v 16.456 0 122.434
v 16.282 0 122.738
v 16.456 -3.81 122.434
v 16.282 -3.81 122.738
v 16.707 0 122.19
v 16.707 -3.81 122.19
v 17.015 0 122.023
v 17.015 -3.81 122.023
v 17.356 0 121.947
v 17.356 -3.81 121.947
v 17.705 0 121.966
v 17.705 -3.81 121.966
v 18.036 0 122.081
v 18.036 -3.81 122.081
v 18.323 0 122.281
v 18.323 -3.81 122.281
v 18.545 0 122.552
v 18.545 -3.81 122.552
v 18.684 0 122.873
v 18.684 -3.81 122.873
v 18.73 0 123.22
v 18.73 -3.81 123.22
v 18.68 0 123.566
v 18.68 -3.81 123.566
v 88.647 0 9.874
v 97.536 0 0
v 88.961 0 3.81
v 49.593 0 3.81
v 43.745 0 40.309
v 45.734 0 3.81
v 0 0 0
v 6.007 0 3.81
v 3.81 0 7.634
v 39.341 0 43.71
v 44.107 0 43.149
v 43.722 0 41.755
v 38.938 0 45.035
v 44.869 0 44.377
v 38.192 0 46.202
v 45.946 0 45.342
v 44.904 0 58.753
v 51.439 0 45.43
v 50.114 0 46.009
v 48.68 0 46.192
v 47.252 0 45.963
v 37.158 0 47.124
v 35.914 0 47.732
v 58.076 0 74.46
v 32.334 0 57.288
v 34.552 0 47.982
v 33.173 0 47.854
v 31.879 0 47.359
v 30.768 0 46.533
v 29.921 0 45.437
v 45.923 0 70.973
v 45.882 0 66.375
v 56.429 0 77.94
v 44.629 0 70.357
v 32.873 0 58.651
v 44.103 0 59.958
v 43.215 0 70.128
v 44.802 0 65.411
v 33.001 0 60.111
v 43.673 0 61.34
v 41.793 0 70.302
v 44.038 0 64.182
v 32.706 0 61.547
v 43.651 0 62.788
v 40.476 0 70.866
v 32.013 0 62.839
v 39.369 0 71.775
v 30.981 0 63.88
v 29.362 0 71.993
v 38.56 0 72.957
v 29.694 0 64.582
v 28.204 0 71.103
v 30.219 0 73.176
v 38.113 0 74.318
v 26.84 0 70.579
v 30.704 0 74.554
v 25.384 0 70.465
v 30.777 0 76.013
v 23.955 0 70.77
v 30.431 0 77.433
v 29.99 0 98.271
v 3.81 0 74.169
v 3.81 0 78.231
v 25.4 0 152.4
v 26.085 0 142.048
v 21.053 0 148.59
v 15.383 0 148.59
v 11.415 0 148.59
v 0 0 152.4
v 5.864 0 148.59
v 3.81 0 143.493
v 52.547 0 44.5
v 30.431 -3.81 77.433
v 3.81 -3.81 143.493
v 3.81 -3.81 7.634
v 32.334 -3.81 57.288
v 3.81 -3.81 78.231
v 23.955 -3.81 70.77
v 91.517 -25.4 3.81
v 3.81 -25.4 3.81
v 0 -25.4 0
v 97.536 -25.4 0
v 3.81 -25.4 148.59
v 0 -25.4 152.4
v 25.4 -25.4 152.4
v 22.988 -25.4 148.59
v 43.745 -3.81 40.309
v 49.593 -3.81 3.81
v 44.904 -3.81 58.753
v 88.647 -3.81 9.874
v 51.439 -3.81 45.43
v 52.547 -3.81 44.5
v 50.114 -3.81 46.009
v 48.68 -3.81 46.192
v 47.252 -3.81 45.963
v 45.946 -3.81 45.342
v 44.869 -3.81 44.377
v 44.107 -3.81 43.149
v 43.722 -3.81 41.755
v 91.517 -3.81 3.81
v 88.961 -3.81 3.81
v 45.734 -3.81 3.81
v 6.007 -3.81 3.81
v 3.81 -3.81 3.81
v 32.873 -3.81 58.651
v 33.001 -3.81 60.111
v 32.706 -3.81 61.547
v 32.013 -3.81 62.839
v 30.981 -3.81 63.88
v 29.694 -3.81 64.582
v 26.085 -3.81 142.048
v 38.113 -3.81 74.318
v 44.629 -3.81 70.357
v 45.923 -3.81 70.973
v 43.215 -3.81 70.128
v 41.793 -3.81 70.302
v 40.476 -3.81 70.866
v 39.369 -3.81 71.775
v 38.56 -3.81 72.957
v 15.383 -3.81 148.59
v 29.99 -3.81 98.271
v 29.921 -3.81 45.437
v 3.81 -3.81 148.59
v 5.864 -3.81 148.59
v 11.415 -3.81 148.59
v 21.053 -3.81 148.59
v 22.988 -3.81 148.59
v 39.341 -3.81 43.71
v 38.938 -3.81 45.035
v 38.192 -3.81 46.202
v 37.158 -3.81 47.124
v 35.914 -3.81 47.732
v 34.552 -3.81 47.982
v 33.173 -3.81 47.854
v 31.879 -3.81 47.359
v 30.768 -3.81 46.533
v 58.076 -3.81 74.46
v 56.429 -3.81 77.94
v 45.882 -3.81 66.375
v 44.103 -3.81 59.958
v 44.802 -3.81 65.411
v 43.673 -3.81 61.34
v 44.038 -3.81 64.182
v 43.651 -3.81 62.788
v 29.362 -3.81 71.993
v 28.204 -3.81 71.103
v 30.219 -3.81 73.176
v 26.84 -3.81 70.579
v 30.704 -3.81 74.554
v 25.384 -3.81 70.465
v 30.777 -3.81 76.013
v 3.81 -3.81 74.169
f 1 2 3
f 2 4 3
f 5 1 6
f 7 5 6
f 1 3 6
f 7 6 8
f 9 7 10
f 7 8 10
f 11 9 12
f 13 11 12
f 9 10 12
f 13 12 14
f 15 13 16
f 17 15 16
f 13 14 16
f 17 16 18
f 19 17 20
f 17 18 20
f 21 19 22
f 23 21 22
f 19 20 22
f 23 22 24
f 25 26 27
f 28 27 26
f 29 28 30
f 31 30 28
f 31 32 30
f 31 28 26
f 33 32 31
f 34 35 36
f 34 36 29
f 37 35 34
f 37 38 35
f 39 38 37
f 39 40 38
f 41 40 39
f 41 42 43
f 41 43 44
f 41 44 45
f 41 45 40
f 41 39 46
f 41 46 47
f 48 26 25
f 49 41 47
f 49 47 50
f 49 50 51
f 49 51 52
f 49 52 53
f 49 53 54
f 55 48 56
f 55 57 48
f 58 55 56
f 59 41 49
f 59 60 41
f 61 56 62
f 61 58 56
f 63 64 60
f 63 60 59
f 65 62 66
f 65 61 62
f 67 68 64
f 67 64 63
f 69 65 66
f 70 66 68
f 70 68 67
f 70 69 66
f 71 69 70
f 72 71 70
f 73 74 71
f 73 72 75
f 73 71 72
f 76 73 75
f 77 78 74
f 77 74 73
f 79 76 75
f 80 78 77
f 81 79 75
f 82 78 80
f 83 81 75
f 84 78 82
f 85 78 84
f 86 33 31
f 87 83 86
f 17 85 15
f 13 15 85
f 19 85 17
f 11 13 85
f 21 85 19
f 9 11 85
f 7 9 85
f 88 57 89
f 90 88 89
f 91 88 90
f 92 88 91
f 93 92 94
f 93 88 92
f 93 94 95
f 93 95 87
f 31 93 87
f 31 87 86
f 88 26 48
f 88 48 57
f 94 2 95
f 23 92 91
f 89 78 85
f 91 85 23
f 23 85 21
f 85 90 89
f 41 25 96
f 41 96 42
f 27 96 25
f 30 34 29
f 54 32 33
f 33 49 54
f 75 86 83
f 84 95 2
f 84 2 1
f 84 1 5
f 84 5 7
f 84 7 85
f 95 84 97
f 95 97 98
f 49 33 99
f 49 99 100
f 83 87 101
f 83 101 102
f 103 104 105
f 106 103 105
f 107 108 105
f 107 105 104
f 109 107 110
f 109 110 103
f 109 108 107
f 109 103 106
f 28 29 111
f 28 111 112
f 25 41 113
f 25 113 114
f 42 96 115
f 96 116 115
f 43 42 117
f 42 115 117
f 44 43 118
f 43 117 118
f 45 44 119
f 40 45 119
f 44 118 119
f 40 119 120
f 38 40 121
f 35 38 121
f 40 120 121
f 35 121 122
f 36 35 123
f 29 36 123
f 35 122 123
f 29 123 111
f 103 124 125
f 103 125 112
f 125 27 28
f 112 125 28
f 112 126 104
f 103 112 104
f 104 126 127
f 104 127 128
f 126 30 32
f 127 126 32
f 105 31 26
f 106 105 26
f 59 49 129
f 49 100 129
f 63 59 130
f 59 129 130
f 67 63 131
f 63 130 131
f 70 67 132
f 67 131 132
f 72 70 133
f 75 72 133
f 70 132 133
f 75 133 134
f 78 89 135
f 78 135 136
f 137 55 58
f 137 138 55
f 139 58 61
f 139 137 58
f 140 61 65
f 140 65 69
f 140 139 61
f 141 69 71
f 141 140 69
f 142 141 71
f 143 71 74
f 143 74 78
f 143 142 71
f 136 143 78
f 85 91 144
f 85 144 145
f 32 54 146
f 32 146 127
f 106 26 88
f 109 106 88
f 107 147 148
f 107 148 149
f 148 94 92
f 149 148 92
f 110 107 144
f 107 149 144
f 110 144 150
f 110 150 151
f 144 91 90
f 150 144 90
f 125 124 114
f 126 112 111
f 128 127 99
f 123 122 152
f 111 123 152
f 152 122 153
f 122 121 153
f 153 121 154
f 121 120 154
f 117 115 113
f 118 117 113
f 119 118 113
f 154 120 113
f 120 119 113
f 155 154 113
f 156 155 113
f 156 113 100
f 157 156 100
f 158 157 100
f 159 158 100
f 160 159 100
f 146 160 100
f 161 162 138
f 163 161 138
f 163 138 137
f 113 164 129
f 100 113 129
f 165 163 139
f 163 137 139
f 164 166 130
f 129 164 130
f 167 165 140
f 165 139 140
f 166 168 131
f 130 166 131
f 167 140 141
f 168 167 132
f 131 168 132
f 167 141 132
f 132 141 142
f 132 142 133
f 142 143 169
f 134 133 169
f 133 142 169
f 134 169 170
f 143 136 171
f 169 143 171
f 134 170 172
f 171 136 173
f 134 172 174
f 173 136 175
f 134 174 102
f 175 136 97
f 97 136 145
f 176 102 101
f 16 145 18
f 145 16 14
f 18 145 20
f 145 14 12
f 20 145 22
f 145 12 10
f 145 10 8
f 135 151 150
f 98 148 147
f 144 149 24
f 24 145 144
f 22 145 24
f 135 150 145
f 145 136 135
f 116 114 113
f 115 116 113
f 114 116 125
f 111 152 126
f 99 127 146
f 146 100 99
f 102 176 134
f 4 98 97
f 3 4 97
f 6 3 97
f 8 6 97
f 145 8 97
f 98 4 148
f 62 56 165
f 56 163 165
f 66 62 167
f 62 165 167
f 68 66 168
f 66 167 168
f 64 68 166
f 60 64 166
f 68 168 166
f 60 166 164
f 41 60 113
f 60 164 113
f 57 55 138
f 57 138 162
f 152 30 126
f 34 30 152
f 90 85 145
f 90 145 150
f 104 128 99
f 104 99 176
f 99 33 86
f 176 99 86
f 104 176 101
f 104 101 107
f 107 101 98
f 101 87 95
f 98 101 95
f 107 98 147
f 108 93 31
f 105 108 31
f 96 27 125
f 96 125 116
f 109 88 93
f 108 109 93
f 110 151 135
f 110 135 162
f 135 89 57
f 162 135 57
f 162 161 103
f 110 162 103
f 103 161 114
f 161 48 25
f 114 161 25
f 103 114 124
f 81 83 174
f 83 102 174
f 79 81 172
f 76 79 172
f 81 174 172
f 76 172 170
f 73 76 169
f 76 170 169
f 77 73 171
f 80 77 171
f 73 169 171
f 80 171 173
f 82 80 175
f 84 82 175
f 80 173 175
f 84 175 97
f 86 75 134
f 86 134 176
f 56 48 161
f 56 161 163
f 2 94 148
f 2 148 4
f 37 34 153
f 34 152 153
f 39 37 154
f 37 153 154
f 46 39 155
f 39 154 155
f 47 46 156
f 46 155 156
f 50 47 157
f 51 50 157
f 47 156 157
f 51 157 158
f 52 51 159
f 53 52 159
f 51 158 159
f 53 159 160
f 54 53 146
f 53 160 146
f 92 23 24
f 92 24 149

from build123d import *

# Parameters (mm, degrees)
F1_DEPTH = 25.4
F3_DEPTH = 3.81
F4_R     = 5.08
F5_R     = 1.27


with BuildPart() as f1:
    # F0 (on Front) → F1 (new body)
    with BuildSketch(Plane.XZ):
        Polygon((0, 152.4), (0, 0), (97.536, 0), (25.4, 152.4), align=None)
        Polygon((3.81, 3.81), (3.81, 148.59), (22.9881477466, 148.59), (91.5173477466, 3.81), align=None, mode=Mode.SUBTRACT)
    extrude(amount=F1_DEPTH)

    # F2 (on face) → F3 (join)
    with BuildSketch(Plane(origin=(0, 0, 0), x_dir=(-1, 0, 0), z_dir=(0, 1, 0))):
        Polygon((-39.4677877212, 66.6927195413), (-56.4292804153, 77.939719714), (-58.0762150779, 74.460280286), (-40.9881443162, 63.1293474326), (-88.6470719162, 9.873963022), (-91.5173477466, 3.81), (-88.9609051741, 3.81), (-41.0075535603, 57.3943818268), (-49.5929707574, 3.81), (-45.7343769892, 3.81), (-37.0705642602, 57.8836738464), (-6.0069643909, 3.81), (-3.81, 3.81), (-3.81, 7.6343454213), (-35.3261969761, 62.4958734908), (-3.81, 74.1685390375), (-3.81, 78.2314609625), (-34.7235350429, 66.7820035392), (-3.81, 143.4933682752), (-3.81, 148.59), (-5.863866516, 148.59), (-25.7159540879, 99.3274123216), (-11.4154306532, 148.59), (-15.3827170934, 148.59), (-29.9899241521, 98.2709454732), (-21.0533379782, 148.59), (-22.9881477466, 148.59), (-26.0848739491, 142.0476206988), align=None)
    extrude(amount=-F3_DEPTH)

    # F4
    f4_edges = [f1.edges().sort_by_distance(p)[0] for p in [
        (40.988144, -1.905, 63.129347),
        (41.007554, -1.905, 57.394382),
        (35.326197, -1.905, 62.495873),
        (37.070564, -1.905, 57.883674),
        (39.467788, -1.905, 66.69272),
        (34.723535, -1.905, 66.782004),
    ]]
    fillet(f4_edges, radius=F4_R)

    # F5
    f5_edges = [f1.edges().sort_by_distance(p)[0] for p in [
        (25.715954, -1.905, 99.327412),
    ]]
    fillet(f5_edges, radius=F5_R)


solid = f1.part
